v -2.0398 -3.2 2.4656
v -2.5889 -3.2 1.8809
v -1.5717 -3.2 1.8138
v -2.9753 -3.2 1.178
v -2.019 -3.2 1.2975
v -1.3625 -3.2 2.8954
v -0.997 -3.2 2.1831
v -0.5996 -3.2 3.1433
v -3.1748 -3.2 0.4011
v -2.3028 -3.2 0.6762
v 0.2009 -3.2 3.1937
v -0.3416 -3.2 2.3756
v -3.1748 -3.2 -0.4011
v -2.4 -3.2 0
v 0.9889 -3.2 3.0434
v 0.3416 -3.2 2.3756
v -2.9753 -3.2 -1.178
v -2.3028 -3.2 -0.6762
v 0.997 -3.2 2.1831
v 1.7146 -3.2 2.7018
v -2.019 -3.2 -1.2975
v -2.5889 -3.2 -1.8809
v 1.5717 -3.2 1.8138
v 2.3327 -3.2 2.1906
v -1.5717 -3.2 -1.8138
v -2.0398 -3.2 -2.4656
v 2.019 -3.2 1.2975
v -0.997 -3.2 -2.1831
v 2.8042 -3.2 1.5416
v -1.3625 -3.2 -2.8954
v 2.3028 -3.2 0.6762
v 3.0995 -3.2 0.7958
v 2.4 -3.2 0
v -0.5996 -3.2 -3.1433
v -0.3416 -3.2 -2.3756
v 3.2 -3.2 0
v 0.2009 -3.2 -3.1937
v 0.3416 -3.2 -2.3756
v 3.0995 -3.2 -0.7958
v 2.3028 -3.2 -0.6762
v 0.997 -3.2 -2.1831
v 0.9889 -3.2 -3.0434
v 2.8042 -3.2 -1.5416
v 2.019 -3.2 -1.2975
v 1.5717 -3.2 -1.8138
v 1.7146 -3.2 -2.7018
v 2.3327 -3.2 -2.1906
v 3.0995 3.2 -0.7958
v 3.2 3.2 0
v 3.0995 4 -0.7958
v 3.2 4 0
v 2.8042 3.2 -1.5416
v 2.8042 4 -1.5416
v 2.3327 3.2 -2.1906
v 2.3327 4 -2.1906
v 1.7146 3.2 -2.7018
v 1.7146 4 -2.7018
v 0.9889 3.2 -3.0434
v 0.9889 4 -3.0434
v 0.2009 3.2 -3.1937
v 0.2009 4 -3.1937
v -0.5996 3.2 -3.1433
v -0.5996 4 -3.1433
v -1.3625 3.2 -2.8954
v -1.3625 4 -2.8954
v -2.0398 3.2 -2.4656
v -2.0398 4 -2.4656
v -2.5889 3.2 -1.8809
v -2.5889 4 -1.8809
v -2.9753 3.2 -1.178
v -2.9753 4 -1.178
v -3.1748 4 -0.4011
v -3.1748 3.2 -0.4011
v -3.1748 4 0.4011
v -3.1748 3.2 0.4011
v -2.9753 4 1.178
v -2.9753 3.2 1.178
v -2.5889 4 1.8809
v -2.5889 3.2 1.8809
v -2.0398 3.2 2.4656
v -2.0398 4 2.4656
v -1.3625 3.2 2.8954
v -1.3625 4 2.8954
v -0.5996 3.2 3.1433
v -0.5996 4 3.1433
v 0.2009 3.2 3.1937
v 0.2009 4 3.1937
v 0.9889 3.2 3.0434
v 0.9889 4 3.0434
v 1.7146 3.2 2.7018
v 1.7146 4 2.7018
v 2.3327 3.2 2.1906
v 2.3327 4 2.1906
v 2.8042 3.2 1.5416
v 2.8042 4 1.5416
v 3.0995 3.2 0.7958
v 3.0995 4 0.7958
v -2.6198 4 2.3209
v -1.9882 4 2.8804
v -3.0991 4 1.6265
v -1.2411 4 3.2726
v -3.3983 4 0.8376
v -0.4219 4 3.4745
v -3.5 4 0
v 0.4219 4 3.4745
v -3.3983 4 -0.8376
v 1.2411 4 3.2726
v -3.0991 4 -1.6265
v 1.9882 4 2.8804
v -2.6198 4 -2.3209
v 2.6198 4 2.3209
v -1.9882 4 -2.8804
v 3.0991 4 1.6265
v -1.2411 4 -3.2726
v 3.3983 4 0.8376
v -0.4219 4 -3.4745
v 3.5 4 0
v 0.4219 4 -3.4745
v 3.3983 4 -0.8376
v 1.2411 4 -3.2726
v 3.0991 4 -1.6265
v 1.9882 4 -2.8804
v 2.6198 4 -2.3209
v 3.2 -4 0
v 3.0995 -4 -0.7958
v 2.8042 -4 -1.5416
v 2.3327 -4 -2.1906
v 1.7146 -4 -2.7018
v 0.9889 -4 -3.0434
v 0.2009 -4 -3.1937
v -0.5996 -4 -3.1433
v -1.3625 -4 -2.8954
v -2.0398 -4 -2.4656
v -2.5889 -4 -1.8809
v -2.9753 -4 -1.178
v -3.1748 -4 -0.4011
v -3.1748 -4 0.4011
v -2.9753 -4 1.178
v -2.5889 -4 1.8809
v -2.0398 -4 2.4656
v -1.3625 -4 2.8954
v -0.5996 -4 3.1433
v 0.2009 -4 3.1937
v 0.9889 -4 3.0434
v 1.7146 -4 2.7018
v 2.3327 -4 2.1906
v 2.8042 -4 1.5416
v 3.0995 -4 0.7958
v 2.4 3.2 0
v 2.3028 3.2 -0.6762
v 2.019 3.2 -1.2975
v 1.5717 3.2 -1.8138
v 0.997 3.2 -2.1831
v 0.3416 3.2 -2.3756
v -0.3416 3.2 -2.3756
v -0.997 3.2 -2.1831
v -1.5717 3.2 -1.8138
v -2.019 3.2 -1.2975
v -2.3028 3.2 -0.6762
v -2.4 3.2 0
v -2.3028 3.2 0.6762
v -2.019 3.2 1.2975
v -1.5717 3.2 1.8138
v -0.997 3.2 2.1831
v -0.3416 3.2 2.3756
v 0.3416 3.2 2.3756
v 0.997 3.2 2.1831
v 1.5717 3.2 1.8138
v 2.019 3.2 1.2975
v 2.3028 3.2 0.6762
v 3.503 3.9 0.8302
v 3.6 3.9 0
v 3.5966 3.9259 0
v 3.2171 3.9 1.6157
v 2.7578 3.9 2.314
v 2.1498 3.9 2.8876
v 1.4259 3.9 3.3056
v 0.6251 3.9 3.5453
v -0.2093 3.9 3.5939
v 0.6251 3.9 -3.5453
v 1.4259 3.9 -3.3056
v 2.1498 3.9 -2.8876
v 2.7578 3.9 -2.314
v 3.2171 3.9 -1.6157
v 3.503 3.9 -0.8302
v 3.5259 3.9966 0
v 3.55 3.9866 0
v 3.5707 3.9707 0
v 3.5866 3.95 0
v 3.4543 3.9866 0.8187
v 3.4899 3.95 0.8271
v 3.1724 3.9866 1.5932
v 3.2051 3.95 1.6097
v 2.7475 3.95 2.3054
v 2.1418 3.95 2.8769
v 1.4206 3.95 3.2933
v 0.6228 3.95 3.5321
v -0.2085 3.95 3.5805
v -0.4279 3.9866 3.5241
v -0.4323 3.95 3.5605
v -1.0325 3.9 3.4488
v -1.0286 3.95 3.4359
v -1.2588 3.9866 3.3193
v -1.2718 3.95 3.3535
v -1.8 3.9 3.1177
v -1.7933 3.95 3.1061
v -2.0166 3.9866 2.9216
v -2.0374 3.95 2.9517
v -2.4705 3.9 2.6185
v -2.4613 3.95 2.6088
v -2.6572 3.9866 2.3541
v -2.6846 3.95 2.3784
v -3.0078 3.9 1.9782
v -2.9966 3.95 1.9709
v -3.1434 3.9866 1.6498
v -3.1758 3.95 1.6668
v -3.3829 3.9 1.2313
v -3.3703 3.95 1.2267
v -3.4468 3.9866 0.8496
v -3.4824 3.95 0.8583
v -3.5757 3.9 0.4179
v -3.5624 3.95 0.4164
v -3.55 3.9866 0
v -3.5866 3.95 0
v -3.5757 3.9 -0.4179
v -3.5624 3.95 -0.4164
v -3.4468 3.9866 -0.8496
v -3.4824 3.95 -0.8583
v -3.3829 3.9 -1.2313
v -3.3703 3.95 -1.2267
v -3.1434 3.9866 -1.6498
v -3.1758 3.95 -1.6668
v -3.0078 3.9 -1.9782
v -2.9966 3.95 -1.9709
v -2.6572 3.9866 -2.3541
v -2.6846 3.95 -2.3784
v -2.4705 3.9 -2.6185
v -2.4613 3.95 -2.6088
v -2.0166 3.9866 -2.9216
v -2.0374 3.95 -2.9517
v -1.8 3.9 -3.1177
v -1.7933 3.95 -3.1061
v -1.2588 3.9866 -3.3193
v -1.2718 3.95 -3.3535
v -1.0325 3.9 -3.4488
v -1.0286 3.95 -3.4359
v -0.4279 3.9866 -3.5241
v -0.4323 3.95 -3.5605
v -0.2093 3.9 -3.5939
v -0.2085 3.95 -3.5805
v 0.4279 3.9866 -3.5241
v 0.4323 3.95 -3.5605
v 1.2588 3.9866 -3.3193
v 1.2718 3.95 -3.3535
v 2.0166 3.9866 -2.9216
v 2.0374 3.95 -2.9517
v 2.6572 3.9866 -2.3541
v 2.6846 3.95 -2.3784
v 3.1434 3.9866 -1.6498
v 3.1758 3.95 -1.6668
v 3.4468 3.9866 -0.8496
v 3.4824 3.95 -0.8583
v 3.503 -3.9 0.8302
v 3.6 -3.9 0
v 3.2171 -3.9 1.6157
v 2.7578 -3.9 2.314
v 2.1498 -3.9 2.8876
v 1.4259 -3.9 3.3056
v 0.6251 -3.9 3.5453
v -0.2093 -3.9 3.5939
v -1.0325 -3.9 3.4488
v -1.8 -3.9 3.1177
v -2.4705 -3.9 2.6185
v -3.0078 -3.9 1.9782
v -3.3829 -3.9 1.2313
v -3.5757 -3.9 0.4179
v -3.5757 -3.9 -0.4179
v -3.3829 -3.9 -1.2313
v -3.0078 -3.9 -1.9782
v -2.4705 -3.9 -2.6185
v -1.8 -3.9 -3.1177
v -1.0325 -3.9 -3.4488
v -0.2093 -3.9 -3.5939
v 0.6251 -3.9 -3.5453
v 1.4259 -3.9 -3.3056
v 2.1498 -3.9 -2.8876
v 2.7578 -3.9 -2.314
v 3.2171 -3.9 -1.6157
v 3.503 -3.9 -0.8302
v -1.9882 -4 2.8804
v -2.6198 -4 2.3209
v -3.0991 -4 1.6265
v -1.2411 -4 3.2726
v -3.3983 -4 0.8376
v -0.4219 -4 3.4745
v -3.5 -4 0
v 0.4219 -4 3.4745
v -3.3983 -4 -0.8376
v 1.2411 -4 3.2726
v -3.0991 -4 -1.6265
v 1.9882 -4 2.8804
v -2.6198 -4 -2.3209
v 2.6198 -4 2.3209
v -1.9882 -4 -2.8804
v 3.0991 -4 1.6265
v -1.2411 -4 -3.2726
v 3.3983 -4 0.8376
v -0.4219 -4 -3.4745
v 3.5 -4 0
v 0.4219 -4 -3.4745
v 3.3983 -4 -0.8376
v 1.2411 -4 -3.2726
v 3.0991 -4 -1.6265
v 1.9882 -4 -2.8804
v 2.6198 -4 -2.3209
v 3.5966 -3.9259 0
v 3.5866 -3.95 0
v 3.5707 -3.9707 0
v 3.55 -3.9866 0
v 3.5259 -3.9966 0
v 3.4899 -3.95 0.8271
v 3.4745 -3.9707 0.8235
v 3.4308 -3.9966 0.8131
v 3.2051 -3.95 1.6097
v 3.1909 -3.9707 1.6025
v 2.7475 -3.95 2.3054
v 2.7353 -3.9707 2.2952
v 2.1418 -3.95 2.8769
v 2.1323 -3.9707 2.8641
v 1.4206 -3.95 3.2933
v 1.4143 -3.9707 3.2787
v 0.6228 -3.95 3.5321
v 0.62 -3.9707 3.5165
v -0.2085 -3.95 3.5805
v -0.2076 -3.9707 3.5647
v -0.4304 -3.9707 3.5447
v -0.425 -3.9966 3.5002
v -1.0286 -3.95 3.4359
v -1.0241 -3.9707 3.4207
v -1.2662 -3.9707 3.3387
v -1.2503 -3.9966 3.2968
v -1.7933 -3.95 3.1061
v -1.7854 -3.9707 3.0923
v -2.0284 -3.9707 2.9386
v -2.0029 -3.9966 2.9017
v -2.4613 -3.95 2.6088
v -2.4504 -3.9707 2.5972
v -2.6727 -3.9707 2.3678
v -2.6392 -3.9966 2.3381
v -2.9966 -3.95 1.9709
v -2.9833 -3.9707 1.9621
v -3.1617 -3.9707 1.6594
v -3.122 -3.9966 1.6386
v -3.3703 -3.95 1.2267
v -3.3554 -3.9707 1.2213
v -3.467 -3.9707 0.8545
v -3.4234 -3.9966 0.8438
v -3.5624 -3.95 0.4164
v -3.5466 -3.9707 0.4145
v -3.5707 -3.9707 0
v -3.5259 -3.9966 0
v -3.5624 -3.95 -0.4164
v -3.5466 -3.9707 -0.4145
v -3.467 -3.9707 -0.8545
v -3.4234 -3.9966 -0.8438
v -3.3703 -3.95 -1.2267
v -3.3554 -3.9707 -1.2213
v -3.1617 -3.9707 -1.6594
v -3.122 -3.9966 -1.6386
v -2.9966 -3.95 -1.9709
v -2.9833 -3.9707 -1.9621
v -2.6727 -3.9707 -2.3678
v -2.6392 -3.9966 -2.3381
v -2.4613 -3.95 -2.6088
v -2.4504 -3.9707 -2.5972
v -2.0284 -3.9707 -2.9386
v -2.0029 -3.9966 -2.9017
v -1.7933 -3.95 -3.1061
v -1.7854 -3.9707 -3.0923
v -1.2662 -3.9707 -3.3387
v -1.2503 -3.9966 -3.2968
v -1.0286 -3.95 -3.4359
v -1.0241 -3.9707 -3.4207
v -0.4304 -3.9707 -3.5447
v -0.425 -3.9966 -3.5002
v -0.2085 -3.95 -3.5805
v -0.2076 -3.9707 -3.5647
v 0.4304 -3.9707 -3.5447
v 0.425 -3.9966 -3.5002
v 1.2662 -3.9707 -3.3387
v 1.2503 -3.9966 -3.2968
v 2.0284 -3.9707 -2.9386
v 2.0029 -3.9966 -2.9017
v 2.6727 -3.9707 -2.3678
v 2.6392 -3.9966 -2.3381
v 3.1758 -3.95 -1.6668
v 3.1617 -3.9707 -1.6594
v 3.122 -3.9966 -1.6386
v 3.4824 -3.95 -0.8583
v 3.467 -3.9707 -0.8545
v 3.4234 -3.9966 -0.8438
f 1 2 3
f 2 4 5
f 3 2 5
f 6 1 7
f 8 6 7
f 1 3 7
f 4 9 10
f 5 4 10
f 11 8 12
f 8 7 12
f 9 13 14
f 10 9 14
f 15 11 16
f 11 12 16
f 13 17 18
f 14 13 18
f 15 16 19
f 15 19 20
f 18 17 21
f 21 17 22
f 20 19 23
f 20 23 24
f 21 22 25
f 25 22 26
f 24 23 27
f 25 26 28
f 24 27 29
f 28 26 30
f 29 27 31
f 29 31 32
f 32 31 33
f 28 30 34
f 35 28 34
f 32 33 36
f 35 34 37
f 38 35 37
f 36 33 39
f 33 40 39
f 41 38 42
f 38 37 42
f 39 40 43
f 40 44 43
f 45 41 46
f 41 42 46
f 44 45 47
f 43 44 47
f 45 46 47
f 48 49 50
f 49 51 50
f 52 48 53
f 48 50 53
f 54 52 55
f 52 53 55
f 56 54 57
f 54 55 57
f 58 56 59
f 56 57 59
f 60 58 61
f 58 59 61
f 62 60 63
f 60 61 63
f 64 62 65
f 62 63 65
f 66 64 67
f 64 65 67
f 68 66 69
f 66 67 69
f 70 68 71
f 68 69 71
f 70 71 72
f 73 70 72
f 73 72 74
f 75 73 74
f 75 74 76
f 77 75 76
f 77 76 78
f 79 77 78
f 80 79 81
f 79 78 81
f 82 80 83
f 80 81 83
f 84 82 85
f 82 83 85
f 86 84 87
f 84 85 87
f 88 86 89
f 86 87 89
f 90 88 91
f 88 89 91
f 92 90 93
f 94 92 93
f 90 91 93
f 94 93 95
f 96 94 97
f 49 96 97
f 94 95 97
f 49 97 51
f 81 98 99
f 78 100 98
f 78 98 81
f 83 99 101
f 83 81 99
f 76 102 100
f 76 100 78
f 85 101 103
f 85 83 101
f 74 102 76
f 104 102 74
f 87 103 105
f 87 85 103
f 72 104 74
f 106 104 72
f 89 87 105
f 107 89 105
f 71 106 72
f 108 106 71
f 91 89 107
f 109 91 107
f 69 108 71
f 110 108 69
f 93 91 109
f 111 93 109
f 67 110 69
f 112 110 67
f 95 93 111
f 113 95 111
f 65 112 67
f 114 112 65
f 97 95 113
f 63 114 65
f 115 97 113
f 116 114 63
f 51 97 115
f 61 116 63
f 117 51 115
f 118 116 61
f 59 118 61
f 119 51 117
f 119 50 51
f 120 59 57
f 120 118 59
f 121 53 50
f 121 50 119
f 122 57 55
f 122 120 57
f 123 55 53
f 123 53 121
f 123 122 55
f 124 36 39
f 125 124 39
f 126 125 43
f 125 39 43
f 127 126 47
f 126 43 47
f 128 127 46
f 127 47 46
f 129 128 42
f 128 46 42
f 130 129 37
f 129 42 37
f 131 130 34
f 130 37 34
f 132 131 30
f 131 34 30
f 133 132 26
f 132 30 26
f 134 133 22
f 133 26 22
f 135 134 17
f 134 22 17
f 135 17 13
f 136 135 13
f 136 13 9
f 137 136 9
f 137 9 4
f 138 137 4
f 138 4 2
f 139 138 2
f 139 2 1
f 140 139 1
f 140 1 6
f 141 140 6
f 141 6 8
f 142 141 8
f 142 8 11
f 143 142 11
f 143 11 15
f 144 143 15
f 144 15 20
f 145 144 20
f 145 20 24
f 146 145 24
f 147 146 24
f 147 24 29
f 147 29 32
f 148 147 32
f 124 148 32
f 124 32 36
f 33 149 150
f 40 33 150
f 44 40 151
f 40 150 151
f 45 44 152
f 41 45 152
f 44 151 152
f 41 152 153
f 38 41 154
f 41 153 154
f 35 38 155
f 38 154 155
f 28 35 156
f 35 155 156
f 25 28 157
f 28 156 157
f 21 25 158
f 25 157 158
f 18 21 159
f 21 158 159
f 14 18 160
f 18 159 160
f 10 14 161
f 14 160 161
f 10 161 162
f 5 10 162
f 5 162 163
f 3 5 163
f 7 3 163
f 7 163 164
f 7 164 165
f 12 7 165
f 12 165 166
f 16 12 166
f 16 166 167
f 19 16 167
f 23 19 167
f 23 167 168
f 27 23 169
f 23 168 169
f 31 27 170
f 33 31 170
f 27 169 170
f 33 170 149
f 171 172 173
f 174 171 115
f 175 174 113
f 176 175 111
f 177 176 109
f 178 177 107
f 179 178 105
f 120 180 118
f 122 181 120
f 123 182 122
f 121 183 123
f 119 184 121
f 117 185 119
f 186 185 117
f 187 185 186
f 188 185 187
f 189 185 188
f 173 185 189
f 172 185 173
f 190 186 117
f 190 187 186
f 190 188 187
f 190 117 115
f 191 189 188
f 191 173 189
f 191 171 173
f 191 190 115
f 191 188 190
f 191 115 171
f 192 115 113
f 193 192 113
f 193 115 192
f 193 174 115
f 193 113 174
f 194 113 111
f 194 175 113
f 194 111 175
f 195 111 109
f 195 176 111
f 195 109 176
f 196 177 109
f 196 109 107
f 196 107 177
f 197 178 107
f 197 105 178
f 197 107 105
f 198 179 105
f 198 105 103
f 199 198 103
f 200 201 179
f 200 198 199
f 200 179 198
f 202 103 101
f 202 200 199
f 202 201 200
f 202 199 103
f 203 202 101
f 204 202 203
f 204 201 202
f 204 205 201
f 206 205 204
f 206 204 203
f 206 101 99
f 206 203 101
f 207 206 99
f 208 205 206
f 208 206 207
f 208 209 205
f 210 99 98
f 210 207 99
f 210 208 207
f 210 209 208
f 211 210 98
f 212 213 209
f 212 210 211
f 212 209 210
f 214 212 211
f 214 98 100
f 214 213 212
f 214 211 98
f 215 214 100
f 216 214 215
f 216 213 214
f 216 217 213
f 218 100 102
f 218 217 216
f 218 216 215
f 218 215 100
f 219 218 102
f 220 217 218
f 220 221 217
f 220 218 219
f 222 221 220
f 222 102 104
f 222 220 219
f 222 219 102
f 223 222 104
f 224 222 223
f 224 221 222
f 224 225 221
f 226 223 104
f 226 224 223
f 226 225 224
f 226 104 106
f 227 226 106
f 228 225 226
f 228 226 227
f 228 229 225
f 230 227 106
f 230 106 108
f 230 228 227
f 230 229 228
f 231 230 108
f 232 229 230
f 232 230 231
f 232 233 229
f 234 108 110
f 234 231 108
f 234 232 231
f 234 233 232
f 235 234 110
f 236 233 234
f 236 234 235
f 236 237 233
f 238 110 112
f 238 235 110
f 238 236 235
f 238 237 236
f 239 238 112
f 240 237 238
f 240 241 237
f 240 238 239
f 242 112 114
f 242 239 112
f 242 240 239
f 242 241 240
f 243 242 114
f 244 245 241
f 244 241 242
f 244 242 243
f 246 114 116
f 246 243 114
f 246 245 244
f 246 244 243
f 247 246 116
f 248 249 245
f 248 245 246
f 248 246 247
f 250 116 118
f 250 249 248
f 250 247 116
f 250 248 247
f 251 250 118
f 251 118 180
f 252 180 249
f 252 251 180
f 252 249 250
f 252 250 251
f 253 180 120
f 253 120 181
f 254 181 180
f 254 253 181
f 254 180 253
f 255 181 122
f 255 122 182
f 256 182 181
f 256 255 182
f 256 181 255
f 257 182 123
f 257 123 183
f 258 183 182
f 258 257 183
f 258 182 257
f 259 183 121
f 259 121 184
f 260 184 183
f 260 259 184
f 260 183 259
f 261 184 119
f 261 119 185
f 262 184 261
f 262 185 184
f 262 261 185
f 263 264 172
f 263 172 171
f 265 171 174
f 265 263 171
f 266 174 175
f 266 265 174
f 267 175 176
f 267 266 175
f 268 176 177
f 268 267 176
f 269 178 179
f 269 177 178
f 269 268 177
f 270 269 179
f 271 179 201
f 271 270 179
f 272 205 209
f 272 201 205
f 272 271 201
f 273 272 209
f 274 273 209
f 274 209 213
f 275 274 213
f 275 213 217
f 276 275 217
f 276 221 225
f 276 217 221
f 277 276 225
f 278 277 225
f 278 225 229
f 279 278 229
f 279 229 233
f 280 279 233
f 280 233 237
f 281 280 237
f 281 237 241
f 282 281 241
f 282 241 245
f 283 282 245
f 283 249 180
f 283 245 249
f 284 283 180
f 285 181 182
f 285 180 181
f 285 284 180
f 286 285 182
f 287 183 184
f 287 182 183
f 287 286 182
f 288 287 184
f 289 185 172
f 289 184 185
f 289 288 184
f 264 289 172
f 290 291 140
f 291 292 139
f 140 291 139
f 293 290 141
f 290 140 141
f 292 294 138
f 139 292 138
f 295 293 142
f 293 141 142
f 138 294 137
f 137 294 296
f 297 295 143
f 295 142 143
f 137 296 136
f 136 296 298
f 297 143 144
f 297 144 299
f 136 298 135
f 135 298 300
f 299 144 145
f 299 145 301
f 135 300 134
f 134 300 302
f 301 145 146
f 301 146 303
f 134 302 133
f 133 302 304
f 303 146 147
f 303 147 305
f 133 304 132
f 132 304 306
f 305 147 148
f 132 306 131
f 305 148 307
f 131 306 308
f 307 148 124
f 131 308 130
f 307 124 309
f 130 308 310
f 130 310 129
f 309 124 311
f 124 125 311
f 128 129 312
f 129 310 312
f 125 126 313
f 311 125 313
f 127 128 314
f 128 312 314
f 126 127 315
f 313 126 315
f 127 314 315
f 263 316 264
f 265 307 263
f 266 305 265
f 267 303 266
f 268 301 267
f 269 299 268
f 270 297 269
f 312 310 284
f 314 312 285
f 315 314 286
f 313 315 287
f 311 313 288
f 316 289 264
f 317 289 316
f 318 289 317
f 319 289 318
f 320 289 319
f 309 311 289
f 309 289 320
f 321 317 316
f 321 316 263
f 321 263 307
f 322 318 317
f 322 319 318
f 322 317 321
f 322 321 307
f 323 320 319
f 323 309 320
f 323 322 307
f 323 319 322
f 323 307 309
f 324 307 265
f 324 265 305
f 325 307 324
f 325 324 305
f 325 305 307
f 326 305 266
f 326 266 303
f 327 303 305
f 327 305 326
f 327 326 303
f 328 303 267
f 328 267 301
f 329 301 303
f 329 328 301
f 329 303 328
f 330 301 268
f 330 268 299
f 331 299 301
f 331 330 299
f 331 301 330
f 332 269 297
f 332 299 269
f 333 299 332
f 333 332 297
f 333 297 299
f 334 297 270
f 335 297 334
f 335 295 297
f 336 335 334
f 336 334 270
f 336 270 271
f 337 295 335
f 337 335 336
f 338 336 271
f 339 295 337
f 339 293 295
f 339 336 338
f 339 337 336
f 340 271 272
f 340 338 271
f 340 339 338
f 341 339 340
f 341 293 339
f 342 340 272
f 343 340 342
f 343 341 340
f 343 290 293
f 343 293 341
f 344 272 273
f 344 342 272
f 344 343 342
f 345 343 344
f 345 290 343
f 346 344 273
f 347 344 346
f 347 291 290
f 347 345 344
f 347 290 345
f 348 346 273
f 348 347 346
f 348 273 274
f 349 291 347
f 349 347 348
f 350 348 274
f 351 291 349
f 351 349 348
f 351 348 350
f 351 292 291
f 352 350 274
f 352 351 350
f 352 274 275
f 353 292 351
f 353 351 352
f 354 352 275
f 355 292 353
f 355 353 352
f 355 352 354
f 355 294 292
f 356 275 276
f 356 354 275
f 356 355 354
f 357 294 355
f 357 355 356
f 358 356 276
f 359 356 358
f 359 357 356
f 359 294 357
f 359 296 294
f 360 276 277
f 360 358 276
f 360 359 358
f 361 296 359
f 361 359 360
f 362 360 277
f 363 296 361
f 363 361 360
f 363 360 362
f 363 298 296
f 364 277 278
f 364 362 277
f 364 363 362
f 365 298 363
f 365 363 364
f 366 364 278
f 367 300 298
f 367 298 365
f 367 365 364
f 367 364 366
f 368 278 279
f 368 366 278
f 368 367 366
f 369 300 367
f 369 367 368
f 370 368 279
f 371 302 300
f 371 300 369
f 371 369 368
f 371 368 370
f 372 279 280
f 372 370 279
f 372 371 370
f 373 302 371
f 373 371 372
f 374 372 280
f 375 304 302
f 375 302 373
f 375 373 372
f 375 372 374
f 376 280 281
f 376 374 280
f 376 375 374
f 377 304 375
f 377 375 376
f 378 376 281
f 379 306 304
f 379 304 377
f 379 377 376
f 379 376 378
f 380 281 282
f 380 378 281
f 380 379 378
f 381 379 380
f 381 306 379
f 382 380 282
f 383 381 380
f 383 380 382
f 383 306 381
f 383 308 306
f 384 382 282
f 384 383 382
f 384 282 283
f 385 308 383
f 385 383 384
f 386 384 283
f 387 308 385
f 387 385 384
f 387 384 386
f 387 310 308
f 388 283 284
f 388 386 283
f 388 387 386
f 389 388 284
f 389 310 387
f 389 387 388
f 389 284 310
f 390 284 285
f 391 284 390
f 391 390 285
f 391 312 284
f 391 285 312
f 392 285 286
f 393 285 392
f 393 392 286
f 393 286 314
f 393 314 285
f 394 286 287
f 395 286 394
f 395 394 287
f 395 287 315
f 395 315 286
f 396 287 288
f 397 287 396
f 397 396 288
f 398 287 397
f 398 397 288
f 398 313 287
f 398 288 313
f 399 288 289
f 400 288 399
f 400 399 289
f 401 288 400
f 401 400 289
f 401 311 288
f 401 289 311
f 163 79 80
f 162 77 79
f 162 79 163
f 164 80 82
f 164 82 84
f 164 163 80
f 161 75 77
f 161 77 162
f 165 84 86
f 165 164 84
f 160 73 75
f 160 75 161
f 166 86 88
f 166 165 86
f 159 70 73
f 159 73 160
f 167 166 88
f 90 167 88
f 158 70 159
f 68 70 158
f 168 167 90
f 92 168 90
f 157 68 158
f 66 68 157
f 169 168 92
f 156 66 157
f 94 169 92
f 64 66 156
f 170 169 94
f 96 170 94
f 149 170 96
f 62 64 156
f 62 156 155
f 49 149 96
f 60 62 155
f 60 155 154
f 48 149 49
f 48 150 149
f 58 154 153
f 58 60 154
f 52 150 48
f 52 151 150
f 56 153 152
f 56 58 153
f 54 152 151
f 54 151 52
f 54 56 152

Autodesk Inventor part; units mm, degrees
ref_plane "YZ Plane" through (0, 0, 0) normal (1, 0, 0) x (0, 1, 0)
ref_plane "XZ Plane" through (0, 0, 0) normal (0, 1, 0) x (-1, 0, 0)
ref_plane "XY Plane" through (0, 0, 0) normal (0, 0, 1) x (1, 0, 0)
sketch "Sketch1" plane through (0, 0, 0) normal (0, 0, 1) x (1, 0, 0)
  line L0 (0, -5.6) -> (0, 5.6) projected
  line L1 (2.4, -3.2) -> (2.4, 3.2)
  line L2 (2.4, 3.2) -> (3.2, 3.2)
  line L3 (3.2, 3.2) -> (3.2, 4)
  line L4 (3.2, 4) -> (3.6, 4)
  line L5 (3.6, 4) -> (3.6, -4)
  line L6 (3.6, -4) -> (3.2, -4)
  line L7 (3.2, -4) -> (3.2, -3.2)
  line L8 (3.2, -3.2) -> (2.4, -3.2)
  point P0 (0, 0)
  point P1 (2.4, 0)
  dimension "d0" = 4.8
  dimension "d1" = 8
  dimension "d2" = 6.4
  dimension "d3" = 0.8
  dimension "d4" = 7.2
revolve "Revolution1" add sketch "Sketch1" angle 360 about axis through (0, -10, 0) along (0, 1, 0)
fillet "Fillet1" radius 0.1 2 edges at (-3.6, 4, 0) (-3.6, -4, 0)
equation "\"d0\" = tpd"
equation "\"d1\" = lu"
equation "\"d2\" = tsd"
equation "\"d3\" = tsl"
equation "\"d4\" = tlad"
equation "\"tpd\" = 4.8"
equation "\"lu\" = 8"
equation "\"tsd\" = 6.4"
equation "\"tsl\" = 0.8"
equation "\"tlad\" = 7.2"
properties part number "18654-Red" material "ABS Plastic"
